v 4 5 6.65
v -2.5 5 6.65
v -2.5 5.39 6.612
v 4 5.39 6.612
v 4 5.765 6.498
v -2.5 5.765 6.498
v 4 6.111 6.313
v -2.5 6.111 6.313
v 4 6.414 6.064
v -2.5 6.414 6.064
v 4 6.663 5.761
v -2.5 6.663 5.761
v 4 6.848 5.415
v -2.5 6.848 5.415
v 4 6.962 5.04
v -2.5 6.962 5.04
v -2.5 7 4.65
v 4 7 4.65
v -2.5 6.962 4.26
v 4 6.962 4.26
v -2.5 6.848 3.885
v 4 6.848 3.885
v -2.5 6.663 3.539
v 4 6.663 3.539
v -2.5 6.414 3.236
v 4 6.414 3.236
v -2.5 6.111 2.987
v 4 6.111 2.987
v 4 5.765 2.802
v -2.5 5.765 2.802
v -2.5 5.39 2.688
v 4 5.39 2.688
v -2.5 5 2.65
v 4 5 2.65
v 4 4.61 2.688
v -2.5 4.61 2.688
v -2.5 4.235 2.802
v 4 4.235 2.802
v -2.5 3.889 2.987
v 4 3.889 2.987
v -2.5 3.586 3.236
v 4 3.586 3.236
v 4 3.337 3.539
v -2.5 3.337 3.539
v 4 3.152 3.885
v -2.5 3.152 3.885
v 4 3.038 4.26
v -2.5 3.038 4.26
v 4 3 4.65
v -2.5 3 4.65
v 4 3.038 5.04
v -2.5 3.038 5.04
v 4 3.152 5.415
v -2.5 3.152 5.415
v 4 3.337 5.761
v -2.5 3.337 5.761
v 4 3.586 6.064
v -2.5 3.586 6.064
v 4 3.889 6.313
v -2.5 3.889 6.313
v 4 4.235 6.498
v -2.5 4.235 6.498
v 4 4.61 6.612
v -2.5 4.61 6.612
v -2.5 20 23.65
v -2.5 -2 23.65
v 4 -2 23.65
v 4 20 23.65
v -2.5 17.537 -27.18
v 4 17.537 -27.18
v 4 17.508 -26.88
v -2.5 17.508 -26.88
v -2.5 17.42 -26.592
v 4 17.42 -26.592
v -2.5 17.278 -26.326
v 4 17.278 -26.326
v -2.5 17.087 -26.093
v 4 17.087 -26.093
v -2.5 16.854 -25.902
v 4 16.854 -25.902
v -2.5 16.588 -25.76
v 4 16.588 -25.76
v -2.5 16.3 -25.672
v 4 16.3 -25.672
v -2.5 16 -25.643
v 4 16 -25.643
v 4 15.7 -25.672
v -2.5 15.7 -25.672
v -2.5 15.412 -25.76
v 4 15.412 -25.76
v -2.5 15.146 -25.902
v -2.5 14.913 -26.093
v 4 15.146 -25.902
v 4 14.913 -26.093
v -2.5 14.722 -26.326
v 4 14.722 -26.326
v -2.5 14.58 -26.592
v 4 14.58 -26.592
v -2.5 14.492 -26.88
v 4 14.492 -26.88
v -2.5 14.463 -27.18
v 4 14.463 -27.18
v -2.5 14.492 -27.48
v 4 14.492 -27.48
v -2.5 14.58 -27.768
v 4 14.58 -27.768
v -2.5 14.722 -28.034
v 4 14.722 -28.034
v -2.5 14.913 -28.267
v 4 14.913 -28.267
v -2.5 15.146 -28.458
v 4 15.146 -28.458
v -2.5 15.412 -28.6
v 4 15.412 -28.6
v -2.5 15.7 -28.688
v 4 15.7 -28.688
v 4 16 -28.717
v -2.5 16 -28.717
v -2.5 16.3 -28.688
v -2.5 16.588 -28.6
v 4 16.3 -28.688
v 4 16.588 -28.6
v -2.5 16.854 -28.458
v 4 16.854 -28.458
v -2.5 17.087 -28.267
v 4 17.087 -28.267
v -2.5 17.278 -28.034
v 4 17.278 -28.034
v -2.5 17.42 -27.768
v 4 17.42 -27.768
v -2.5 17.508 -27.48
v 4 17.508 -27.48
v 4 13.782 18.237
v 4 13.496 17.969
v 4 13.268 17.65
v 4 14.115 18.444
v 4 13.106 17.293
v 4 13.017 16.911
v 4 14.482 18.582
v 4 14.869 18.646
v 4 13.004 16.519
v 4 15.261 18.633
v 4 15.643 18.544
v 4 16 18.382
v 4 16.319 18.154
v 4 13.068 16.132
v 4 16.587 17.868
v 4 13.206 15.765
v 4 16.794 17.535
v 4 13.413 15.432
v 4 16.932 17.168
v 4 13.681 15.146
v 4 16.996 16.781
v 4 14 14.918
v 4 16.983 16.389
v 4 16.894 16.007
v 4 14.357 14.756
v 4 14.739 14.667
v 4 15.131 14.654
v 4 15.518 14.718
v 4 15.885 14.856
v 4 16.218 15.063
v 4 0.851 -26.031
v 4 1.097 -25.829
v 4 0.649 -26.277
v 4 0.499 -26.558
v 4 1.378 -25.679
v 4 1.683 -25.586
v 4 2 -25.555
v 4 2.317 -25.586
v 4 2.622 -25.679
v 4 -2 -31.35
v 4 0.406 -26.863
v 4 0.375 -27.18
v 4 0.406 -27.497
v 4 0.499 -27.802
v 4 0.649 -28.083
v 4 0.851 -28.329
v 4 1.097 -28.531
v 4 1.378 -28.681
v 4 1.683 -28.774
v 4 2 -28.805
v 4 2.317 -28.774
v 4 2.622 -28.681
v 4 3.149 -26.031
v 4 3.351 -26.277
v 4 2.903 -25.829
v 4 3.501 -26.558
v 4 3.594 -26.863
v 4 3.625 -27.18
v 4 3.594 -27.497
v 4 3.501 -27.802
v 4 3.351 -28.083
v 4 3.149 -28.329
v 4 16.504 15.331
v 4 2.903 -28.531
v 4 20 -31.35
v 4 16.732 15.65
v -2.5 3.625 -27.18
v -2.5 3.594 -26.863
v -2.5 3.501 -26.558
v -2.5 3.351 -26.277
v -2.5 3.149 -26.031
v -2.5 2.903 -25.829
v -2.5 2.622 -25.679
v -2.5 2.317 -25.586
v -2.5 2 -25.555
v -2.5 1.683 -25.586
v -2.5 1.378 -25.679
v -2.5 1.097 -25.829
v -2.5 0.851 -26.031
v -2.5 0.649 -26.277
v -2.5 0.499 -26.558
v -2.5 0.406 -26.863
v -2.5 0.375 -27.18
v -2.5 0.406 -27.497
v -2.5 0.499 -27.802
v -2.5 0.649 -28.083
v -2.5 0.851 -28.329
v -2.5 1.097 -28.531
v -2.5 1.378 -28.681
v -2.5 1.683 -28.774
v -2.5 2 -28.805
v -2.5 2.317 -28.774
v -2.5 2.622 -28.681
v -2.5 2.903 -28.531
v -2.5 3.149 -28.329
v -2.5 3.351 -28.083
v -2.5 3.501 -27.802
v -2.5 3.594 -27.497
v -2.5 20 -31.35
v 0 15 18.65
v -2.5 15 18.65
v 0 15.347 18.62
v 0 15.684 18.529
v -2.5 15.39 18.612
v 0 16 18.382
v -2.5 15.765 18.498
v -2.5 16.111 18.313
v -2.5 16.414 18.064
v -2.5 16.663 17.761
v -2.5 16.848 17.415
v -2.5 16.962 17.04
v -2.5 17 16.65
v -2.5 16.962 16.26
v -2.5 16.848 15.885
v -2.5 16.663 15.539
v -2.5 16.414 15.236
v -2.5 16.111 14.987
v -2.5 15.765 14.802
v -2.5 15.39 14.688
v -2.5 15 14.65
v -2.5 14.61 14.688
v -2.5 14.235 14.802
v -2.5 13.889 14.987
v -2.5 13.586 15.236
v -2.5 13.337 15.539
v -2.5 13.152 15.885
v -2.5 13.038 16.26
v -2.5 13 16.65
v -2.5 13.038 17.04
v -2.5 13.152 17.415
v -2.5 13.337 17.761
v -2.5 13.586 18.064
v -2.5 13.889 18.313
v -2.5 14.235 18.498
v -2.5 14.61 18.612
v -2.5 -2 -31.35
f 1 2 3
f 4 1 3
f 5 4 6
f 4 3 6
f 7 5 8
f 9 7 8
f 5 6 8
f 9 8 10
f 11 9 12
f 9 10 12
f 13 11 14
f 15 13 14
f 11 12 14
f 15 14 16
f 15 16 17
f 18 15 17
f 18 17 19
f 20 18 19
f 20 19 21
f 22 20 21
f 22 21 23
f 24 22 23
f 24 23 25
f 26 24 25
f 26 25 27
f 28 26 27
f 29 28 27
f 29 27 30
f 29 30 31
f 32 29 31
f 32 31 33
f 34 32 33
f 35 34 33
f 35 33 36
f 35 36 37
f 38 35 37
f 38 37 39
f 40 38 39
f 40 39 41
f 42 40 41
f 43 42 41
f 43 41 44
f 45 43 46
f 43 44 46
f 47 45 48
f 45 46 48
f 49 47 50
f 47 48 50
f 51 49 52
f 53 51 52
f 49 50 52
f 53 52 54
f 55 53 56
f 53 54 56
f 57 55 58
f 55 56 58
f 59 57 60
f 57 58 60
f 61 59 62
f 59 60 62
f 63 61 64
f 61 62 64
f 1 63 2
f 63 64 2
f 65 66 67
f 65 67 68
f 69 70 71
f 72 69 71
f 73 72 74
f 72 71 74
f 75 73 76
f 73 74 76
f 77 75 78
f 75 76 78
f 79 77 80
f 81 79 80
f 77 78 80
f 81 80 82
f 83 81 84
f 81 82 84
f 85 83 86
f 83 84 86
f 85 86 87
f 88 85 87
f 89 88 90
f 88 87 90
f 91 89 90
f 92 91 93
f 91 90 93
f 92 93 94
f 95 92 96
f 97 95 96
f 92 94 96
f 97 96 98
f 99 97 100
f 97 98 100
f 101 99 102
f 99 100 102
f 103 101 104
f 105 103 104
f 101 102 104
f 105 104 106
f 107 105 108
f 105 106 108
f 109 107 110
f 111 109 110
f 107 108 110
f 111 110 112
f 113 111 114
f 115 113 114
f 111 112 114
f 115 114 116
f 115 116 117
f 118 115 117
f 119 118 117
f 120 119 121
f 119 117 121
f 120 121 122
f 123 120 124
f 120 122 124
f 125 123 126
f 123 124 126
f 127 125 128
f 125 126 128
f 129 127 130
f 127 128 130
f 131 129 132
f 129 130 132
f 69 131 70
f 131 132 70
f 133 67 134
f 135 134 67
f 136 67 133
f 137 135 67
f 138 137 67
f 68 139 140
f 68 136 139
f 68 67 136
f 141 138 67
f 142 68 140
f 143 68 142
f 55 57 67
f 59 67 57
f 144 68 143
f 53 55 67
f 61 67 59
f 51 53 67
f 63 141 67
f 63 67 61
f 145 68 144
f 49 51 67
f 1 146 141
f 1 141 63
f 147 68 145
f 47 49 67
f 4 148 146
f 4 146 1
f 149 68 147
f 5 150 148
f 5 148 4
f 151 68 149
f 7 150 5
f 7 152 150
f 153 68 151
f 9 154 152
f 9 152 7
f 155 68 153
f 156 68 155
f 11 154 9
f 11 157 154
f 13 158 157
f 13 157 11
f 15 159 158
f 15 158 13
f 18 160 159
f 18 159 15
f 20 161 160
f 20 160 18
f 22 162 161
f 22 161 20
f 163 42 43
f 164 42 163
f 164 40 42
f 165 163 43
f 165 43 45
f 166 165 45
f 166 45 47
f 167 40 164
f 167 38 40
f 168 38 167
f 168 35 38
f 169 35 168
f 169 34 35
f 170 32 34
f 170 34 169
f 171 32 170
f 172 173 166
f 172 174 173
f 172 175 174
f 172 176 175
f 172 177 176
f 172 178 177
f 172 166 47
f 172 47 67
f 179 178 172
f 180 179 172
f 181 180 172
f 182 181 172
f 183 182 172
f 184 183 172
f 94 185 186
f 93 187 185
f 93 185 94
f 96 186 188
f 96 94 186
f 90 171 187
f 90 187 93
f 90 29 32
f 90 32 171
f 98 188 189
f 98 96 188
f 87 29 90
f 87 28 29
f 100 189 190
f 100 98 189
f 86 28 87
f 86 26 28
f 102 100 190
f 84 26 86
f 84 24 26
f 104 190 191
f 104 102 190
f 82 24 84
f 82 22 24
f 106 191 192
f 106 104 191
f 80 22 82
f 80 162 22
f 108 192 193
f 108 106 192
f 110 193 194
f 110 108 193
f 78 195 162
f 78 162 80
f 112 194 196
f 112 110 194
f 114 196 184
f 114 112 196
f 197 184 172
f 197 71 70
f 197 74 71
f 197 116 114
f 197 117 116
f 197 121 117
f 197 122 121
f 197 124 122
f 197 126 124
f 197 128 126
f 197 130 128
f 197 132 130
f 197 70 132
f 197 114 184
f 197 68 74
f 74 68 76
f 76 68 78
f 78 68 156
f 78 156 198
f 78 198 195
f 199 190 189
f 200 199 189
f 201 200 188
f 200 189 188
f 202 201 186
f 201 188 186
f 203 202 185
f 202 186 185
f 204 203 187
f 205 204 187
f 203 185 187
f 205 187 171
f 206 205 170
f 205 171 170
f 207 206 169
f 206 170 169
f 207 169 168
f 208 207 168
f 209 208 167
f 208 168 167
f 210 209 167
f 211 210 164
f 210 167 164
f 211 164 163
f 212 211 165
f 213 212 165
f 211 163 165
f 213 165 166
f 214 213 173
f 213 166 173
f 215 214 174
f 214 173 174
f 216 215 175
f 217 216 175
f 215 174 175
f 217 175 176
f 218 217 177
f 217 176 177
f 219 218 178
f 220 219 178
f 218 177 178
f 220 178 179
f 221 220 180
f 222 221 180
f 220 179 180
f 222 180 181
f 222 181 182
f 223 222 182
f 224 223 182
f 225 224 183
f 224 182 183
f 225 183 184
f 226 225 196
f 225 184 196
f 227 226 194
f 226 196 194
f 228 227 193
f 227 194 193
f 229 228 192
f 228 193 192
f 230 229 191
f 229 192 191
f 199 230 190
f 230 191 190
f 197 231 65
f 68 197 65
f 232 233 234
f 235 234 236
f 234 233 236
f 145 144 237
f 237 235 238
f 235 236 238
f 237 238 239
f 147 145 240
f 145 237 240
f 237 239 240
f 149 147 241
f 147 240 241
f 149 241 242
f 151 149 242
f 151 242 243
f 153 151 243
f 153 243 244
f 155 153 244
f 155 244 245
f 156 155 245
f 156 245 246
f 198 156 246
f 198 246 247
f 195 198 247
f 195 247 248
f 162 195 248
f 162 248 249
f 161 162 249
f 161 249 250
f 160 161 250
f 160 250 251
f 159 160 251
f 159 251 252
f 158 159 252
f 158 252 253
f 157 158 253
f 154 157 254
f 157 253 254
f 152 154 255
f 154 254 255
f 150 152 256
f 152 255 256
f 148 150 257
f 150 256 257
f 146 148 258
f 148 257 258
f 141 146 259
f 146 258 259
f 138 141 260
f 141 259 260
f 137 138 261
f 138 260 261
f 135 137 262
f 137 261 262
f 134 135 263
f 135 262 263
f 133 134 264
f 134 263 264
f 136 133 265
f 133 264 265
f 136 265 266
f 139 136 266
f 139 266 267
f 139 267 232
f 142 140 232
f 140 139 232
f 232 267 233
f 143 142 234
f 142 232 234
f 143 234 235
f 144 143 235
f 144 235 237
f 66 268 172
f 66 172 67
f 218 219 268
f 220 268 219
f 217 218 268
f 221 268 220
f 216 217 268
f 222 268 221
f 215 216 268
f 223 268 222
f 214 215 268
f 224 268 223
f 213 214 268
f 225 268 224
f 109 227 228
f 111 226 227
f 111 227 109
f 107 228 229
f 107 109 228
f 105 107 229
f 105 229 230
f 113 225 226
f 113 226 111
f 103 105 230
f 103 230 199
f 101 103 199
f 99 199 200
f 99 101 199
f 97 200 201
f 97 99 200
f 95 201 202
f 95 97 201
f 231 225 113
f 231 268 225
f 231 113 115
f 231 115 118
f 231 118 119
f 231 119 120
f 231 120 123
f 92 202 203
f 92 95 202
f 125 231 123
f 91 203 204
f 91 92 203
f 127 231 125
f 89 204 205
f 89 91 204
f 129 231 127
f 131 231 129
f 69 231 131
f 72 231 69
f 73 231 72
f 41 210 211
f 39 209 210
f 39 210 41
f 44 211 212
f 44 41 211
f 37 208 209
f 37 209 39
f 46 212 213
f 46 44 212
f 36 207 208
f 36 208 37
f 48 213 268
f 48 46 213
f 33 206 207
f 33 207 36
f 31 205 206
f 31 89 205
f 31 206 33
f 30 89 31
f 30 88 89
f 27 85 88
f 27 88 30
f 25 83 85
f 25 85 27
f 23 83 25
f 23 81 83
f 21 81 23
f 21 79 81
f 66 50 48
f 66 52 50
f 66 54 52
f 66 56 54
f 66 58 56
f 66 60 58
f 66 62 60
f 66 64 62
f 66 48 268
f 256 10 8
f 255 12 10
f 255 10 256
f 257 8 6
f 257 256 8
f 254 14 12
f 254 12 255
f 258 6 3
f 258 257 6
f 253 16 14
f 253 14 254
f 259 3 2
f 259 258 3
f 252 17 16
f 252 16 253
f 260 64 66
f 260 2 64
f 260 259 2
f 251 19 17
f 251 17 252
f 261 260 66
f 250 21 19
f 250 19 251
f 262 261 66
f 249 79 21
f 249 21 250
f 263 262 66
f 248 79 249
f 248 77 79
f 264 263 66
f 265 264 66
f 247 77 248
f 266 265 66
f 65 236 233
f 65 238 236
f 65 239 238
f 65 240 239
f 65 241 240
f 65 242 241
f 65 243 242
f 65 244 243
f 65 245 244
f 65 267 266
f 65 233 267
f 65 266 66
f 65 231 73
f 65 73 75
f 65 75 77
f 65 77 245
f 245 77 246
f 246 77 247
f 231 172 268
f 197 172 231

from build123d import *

# Parameters (mm, degrees)
BOSS_EXTRU_1_DEPTH      = 20
ESQUISSE3_W             = 4
ESQUISSE3_H             = 18
BOSS_EXTRU_2_DEPTH      = 20
ESQUISSE4_W             = 4
ESQUISSE4_H             = 18
BOSS_EXTRU_3_DEPTH      = 20
ESQUISSE5_W             = 17.65
ESQUISSE5_H             = 18
ESQUISSE5_W_2           = 16.35
ESQUISSE5_R             = 2
ENL_V_MAT_EXTRU_1_DEPTH = 20
ESQUISSE6_W             = 4
ESQUISSE6_H             = 26
BOSS_EXTRU_4_DEPTH      = 4
ESQUISSE7_R             = 2
ENL_V_MAT_EXTRU_2_DEPTH = 4
ESQUISSE8_R             = 2
ENL_V_MAT_EXTRU_3_DEPTH = 4
ESQUISSE9_W             = 4
ESQUISSE9_H             = 26
BOSS_EXTRU_5_DEPTH      = 8
ENL_V_MAT_EXTRU_5_DEPTH = 8
ESQUISSE13_W            = 20.25
ESQUISSE13_H            = 28
ENL_V_MAT_EXTRU_7_DEPTH = 46.255524525
ESQUISSE14_W            = 29
ESQUISSE14_H            = 22
ESQUISSE14_R            = 1.537122226
ESQUISSE14_R_2          = 1.624788677
BOSS_EXTRU_6_DEPTH      = 6.5
BOSS_EXTRU_7_START      = 2.5
ESQUISSE15_W            = 26
ESQUISSE15_H            = 22
ESQUISSE15_R            = 2
BOSS_EXTRU_7_DEPTH      = 2.5


with BuildPart() as part:
    # Esquisse1 → Boss.-Extru.1 (new body)
    with BuildSketch(Plane.XY):
        Polygon((0, 16), (0, 0), (24.25, 0), (24.25, 2), (4, 2), (4, 16), align=None)
        Polygon((24.25, 0), (0, 0), (0, -2), (20.25, -2), (20.25, -24), (24.25, -24), align=None)
    extrude(amount=BOSS_EXTRU_1_DEPTH)

    # Esquisse3 → Boss.-Extru.2 (add)
    with BuildSketch(Plane(origin=(0, 0, 0), x_dir=(-1, 0, 0), z_dir=(0, 0, -1))):
        with Locations((-2, 7)):
            Rectangle(ESQUISSE3_W, ESQUISSE3_H)
    extrude(amount=BOSS_EXTRU_2_DEPTH)

    # Esquisse4 → Boss.-Extru.3 (add)
    with BuildSketch(Plane.XY.offset(20)):
        with Locations((2, 7)):
            Rectangle(ESQUISSE4_W, ESQUISSE4_H)
    extrude(amount=BOSS_EXTRU_3_DEPTH)

    # Esquisse5 → Enlèv. mat.-Extru.1 (cut)
    with BuildSketch(Plane.ZY):
        with Locations((-11.175, 7)):
            Rectangle(ESQUISSE5_W, ESQUISSE5_H)
        with Locations((31.825, 7)):
            Rectangle(ESQUISSE5_W_2, ESQUISSE5_H)
        with Locations((16.65, 15)):
            Circle(ESQUISSE5_R)
        with Locations((4.65, 5)):
            Circle(ESQUISSE5_R)
    extrude(amount=-ENL_V_MAT_EXTRU_1_DEPTH, mode=Mode.SUBTRACT)

    # Esquisse6 → Boss.-Extru.4 (add)
    with BuildSketch(Plane(origin=(0, 16, 0), x_dir=(1, 0, 0), z_dir=(0, 1, 0))):
        with Locations((2, -10.65)):
            Rectangle(ESQUISSE6_W, ESQUISSE6_H)
    extrude(amount=BOSS_EXTRU_4_DEPTH)

    # Esquisse7 → Enlèv. mat.-Extru.2 (cut)
    with BuildSketch(Plane.ZY):
        with Locations((16.65, 15)):
            Circle(ESQUISSE7_R)
    extrude(amount=-ENL_V_MAT_EXTRU_2_DEPTH, mode=Mode.SUBTRACT)

    # Esquisse8 → Enlèv. mat.-Extru.3 (cut)
    with BuildSketch(Plane.ZY.offset(-20.25)):
        with Locations((20, -7)):
            Circle(ESQUISSE8_R)
        with Locations((20, -20)):
            Circle(ESQUISSE8_R)
    extrude(amount=-ENL_V_MAT_EXTRU_3_DEPTH, mode=Mode.SUBTRACT)

    # Esquisse9 → Boss.-Extru.5 (add)
    with BuildSketch(Plane.XY.offset(20)):
        with Locations((22.25, -11)):
            Rectangle(ESQUISSE9_W, ESQUISSE9_H)
    extrude(amount=BOSS_EXTRU_5_DEPTH)

    # Esquisse11 → Enlèv. mat.-Extru.5 (cut)
    with BuildSketch(Plane.ZY.offset(-20.25)):
        with BuildLine():
            ThreePointArc((20, -9), (21.414213562, -8.414213562), (22, -7))
            ThreePointArc((22, -7), (21.414213562, -5.585786438), (20, -5))
            Line((20, -5), (20, -9))
        make_face()
        with BuildLine():
            Line((20, -9), (20, -5))
            ThreePointArc((20, -5), (18, -7), (20, -9))
        make_face()
        with BuildLine():
            ThreePointArc((20, -22), (21.414213562, -21.414213562), (22, -20))
            ThreePointArc((22, -20), (21.414213562, -18.585786438), (20, -18))
            Line((20, -18), (20, -22))
        make_face()
        with BuildLine():
            Line((20, -22), (20, -18))
            ThreePointArc((20, -18), (18, -20), (20, -22))
        make_face()
        Polygon((14, -24), (0, -2), (0, -24), align=None)
    extrude(amount=-ENL_V_MAT_EXTRU_5_DEPTH, mode=Mode.SUBTRACT)

    # Esquisse13 → Enlèv. mat.-Extru.7 (cut, through all)
    with BuildSketch(Plane(origin=(0, 2, 0), x_dir=(1, 0, 0), z_dir=(0, 1, 0))):
        with Locations((14.125, -14)):
            Rectangle(ESQUISSE13_W, ESQUISSE13_H)
    extrude(amount=-ENL_V_MAT_EXTRU_7_DEPTH, mode=Mode.SUBTRACT)

    # Esquisse14 → Boss.-Extru.6 (add)
    with BuildSketch(Plane(origin=(4, 0, 0), x_dir=(0, 0, -1), z_dir=(1, 0, 0))):
        with Locations((16.85, 9)):
            Rectangle(ESQUISSE14_W, ESQUISSE14_H)
        with Locations(Location((27.18, 16, 0), (0, 0, 90))):
            Circle(ESQUISSE14_R, mode=Mode.SUBTRACT)
        with Locations(Location((27.18, 2, 0), (0, 0, 90))):
            Circle(ESQUISSE14_R_2, mode=Mode.SUBTRACT)
    extrude(amount=-BOSS_EXTRU_6_DEPTH)

    # Esquisse15 → Boss.-Extru.7 (add)
    with BuildSketch(Plane.ZY.offset(BOSS_EXTRU_7_START)):
        with Locations((10.65, 9)):
            Rectangle(ESQUISSE15_W, ESQUISSE15_H)
        with Locations((4.65, 5)):
            Circle(ESQUISSE15_R, mode=Mode.SUBTRACT)
        with Locations((16.65, 15)):
            Circle(ESQUISSE15_R, mode=Mode.SUBTRACT)
    extrude(amount=-BOSS_EXTRU_7_DEPTH)


solid = part.part
